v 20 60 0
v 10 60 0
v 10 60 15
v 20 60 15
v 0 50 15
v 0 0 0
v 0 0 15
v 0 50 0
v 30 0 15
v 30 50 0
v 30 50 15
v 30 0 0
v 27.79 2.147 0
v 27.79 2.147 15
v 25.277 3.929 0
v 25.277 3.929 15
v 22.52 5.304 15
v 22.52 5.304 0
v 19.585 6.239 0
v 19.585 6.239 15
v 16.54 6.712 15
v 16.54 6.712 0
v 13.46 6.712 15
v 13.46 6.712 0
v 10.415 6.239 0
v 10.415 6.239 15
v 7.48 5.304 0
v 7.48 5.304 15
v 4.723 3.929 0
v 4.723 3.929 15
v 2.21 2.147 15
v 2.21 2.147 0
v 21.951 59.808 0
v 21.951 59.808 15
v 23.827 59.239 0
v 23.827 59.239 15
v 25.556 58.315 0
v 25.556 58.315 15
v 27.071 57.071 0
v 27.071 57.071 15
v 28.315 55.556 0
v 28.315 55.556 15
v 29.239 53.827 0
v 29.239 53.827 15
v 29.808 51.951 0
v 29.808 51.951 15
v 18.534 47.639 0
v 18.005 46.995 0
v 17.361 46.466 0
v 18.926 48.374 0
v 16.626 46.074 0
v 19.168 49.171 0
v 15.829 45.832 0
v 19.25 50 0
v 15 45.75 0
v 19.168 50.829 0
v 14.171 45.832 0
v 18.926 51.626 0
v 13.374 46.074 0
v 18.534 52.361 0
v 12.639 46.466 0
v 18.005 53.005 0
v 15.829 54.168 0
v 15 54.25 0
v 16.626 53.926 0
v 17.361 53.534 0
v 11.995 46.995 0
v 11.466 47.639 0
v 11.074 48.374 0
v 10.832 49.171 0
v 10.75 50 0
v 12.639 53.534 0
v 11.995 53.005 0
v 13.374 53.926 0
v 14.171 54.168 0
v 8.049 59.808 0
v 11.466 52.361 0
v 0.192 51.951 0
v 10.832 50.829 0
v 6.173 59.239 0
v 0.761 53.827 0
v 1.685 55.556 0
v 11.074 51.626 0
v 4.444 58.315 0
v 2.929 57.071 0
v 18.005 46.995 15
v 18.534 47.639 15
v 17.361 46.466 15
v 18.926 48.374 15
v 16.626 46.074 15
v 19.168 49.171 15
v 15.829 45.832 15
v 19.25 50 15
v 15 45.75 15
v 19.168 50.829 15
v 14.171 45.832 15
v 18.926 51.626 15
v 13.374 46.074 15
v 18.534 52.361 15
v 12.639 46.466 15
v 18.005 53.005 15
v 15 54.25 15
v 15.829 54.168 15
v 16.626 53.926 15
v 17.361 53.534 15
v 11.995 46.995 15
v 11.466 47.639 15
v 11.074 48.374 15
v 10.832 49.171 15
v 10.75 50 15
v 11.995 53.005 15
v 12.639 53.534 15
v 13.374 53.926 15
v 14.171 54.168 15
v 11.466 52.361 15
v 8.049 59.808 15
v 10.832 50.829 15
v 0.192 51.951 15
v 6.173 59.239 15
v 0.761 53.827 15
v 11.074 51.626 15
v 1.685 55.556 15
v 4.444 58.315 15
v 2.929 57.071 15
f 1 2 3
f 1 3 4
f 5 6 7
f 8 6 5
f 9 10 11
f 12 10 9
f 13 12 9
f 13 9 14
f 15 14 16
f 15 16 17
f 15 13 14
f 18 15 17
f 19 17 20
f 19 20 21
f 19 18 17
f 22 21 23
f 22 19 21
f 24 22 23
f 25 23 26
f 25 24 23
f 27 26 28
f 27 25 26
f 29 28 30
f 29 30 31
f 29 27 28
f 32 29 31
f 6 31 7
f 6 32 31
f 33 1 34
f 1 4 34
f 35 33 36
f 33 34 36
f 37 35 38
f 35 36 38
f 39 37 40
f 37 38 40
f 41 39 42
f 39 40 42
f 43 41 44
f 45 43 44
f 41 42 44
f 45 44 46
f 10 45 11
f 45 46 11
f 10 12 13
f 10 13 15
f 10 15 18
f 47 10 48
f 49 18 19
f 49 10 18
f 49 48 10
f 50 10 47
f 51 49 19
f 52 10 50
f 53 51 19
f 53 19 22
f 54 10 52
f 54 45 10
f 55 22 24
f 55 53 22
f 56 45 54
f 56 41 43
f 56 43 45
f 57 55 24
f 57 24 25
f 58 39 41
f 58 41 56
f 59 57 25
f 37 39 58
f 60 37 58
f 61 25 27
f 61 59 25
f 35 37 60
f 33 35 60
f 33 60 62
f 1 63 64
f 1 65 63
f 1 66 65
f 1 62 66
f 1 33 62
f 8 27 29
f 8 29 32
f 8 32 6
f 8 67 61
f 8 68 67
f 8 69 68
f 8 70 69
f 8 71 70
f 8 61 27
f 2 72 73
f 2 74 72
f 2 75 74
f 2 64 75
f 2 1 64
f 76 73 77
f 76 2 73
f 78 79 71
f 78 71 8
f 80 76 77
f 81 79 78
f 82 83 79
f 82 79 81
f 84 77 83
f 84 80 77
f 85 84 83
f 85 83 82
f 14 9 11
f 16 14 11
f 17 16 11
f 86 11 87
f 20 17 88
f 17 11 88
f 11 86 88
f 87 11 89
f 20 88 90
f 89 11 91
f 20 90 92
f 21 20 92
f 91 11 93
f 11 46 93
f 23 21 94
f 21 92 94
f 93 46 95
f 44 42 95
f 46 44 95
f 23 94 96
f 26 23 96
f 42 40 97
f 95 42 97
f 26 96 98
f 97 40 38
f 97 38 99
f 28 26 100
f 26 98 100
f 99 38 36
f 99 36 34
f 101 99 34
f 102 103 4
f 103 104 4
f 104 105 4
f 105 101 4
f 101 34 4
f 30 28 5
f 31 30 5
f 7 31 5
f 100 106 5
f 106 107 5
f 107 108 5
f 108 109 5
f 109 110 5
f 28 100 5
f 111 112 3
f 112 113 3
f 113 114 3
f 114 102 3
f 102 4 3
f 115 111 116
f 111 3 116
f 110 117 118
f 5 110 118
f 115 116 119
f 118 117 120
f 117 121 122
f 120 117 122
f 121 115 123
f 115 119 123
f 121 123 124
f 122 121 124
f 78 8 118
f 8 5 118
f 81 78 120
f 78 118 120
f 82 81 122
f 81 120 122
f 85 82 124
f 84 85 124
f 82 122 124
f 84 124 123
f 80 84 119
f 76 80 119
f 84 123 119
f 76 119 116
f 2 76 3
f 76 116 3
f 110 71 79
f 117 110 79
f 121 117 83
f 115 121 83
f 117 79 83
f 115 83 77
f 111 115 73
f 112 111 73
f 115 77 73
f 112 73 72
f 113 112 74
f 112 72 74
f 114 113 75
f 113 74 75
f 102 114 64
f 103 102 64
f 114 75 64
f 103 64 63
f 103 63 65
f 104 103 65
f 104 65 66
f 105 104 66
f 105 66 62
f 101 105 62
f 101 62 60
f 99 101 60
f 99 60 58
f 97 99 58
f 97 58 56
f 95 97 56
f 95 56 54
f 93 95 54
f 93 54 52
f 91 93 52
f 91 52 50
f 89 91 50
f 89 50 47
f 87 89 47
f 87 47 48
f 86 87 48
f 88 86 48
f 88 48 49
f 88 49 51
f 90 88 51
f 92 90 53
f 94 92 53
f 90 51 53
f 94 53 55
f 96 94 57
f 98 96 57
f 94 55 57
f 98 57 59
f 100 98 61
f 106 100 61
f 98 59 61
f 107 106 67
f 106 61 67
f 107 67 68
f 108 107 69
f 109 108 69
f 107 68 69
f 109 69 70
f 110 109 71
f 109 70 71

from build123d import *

# Parameters (mm, degrees)
BOSS_EXTRU_1_DEPTH = 15
TROU_TARAUD_M101_D = 8.5
CONG_1_R           = 10


with BuildPart() as part:
    # Esquisse1 → Boss.-Extru.1 (new body)
    with BuildSketch(Plane.XY):
        with BuildLine():
            Line((0, 0), (0, 60))
            Line((0, 60), (30, 60))
            Line((30, 60), (30, 0))
            ThreePointArc((30, 0), (15, 6.771243445), (0, 0))
        make_face()
    extrude(amount=BOSS_EXTRU_1_DEPTH)

    # Trou taraudé M101 (through all)
    with Locations(Plane.XY.offset(15)):
        with Locations((15, 50)):
            Hole(TROU_TARAUD_M101_D / 2)

    # Congé1
    cong_1_edges = [part.edges().sort_by_distance(p)[0] for p in [
        (0, 60, 7.5),
        (30, 60, 7.5),
    ]]
    fillet(cong_1_edges, radius=CONG_1_R)


solid = part.part
